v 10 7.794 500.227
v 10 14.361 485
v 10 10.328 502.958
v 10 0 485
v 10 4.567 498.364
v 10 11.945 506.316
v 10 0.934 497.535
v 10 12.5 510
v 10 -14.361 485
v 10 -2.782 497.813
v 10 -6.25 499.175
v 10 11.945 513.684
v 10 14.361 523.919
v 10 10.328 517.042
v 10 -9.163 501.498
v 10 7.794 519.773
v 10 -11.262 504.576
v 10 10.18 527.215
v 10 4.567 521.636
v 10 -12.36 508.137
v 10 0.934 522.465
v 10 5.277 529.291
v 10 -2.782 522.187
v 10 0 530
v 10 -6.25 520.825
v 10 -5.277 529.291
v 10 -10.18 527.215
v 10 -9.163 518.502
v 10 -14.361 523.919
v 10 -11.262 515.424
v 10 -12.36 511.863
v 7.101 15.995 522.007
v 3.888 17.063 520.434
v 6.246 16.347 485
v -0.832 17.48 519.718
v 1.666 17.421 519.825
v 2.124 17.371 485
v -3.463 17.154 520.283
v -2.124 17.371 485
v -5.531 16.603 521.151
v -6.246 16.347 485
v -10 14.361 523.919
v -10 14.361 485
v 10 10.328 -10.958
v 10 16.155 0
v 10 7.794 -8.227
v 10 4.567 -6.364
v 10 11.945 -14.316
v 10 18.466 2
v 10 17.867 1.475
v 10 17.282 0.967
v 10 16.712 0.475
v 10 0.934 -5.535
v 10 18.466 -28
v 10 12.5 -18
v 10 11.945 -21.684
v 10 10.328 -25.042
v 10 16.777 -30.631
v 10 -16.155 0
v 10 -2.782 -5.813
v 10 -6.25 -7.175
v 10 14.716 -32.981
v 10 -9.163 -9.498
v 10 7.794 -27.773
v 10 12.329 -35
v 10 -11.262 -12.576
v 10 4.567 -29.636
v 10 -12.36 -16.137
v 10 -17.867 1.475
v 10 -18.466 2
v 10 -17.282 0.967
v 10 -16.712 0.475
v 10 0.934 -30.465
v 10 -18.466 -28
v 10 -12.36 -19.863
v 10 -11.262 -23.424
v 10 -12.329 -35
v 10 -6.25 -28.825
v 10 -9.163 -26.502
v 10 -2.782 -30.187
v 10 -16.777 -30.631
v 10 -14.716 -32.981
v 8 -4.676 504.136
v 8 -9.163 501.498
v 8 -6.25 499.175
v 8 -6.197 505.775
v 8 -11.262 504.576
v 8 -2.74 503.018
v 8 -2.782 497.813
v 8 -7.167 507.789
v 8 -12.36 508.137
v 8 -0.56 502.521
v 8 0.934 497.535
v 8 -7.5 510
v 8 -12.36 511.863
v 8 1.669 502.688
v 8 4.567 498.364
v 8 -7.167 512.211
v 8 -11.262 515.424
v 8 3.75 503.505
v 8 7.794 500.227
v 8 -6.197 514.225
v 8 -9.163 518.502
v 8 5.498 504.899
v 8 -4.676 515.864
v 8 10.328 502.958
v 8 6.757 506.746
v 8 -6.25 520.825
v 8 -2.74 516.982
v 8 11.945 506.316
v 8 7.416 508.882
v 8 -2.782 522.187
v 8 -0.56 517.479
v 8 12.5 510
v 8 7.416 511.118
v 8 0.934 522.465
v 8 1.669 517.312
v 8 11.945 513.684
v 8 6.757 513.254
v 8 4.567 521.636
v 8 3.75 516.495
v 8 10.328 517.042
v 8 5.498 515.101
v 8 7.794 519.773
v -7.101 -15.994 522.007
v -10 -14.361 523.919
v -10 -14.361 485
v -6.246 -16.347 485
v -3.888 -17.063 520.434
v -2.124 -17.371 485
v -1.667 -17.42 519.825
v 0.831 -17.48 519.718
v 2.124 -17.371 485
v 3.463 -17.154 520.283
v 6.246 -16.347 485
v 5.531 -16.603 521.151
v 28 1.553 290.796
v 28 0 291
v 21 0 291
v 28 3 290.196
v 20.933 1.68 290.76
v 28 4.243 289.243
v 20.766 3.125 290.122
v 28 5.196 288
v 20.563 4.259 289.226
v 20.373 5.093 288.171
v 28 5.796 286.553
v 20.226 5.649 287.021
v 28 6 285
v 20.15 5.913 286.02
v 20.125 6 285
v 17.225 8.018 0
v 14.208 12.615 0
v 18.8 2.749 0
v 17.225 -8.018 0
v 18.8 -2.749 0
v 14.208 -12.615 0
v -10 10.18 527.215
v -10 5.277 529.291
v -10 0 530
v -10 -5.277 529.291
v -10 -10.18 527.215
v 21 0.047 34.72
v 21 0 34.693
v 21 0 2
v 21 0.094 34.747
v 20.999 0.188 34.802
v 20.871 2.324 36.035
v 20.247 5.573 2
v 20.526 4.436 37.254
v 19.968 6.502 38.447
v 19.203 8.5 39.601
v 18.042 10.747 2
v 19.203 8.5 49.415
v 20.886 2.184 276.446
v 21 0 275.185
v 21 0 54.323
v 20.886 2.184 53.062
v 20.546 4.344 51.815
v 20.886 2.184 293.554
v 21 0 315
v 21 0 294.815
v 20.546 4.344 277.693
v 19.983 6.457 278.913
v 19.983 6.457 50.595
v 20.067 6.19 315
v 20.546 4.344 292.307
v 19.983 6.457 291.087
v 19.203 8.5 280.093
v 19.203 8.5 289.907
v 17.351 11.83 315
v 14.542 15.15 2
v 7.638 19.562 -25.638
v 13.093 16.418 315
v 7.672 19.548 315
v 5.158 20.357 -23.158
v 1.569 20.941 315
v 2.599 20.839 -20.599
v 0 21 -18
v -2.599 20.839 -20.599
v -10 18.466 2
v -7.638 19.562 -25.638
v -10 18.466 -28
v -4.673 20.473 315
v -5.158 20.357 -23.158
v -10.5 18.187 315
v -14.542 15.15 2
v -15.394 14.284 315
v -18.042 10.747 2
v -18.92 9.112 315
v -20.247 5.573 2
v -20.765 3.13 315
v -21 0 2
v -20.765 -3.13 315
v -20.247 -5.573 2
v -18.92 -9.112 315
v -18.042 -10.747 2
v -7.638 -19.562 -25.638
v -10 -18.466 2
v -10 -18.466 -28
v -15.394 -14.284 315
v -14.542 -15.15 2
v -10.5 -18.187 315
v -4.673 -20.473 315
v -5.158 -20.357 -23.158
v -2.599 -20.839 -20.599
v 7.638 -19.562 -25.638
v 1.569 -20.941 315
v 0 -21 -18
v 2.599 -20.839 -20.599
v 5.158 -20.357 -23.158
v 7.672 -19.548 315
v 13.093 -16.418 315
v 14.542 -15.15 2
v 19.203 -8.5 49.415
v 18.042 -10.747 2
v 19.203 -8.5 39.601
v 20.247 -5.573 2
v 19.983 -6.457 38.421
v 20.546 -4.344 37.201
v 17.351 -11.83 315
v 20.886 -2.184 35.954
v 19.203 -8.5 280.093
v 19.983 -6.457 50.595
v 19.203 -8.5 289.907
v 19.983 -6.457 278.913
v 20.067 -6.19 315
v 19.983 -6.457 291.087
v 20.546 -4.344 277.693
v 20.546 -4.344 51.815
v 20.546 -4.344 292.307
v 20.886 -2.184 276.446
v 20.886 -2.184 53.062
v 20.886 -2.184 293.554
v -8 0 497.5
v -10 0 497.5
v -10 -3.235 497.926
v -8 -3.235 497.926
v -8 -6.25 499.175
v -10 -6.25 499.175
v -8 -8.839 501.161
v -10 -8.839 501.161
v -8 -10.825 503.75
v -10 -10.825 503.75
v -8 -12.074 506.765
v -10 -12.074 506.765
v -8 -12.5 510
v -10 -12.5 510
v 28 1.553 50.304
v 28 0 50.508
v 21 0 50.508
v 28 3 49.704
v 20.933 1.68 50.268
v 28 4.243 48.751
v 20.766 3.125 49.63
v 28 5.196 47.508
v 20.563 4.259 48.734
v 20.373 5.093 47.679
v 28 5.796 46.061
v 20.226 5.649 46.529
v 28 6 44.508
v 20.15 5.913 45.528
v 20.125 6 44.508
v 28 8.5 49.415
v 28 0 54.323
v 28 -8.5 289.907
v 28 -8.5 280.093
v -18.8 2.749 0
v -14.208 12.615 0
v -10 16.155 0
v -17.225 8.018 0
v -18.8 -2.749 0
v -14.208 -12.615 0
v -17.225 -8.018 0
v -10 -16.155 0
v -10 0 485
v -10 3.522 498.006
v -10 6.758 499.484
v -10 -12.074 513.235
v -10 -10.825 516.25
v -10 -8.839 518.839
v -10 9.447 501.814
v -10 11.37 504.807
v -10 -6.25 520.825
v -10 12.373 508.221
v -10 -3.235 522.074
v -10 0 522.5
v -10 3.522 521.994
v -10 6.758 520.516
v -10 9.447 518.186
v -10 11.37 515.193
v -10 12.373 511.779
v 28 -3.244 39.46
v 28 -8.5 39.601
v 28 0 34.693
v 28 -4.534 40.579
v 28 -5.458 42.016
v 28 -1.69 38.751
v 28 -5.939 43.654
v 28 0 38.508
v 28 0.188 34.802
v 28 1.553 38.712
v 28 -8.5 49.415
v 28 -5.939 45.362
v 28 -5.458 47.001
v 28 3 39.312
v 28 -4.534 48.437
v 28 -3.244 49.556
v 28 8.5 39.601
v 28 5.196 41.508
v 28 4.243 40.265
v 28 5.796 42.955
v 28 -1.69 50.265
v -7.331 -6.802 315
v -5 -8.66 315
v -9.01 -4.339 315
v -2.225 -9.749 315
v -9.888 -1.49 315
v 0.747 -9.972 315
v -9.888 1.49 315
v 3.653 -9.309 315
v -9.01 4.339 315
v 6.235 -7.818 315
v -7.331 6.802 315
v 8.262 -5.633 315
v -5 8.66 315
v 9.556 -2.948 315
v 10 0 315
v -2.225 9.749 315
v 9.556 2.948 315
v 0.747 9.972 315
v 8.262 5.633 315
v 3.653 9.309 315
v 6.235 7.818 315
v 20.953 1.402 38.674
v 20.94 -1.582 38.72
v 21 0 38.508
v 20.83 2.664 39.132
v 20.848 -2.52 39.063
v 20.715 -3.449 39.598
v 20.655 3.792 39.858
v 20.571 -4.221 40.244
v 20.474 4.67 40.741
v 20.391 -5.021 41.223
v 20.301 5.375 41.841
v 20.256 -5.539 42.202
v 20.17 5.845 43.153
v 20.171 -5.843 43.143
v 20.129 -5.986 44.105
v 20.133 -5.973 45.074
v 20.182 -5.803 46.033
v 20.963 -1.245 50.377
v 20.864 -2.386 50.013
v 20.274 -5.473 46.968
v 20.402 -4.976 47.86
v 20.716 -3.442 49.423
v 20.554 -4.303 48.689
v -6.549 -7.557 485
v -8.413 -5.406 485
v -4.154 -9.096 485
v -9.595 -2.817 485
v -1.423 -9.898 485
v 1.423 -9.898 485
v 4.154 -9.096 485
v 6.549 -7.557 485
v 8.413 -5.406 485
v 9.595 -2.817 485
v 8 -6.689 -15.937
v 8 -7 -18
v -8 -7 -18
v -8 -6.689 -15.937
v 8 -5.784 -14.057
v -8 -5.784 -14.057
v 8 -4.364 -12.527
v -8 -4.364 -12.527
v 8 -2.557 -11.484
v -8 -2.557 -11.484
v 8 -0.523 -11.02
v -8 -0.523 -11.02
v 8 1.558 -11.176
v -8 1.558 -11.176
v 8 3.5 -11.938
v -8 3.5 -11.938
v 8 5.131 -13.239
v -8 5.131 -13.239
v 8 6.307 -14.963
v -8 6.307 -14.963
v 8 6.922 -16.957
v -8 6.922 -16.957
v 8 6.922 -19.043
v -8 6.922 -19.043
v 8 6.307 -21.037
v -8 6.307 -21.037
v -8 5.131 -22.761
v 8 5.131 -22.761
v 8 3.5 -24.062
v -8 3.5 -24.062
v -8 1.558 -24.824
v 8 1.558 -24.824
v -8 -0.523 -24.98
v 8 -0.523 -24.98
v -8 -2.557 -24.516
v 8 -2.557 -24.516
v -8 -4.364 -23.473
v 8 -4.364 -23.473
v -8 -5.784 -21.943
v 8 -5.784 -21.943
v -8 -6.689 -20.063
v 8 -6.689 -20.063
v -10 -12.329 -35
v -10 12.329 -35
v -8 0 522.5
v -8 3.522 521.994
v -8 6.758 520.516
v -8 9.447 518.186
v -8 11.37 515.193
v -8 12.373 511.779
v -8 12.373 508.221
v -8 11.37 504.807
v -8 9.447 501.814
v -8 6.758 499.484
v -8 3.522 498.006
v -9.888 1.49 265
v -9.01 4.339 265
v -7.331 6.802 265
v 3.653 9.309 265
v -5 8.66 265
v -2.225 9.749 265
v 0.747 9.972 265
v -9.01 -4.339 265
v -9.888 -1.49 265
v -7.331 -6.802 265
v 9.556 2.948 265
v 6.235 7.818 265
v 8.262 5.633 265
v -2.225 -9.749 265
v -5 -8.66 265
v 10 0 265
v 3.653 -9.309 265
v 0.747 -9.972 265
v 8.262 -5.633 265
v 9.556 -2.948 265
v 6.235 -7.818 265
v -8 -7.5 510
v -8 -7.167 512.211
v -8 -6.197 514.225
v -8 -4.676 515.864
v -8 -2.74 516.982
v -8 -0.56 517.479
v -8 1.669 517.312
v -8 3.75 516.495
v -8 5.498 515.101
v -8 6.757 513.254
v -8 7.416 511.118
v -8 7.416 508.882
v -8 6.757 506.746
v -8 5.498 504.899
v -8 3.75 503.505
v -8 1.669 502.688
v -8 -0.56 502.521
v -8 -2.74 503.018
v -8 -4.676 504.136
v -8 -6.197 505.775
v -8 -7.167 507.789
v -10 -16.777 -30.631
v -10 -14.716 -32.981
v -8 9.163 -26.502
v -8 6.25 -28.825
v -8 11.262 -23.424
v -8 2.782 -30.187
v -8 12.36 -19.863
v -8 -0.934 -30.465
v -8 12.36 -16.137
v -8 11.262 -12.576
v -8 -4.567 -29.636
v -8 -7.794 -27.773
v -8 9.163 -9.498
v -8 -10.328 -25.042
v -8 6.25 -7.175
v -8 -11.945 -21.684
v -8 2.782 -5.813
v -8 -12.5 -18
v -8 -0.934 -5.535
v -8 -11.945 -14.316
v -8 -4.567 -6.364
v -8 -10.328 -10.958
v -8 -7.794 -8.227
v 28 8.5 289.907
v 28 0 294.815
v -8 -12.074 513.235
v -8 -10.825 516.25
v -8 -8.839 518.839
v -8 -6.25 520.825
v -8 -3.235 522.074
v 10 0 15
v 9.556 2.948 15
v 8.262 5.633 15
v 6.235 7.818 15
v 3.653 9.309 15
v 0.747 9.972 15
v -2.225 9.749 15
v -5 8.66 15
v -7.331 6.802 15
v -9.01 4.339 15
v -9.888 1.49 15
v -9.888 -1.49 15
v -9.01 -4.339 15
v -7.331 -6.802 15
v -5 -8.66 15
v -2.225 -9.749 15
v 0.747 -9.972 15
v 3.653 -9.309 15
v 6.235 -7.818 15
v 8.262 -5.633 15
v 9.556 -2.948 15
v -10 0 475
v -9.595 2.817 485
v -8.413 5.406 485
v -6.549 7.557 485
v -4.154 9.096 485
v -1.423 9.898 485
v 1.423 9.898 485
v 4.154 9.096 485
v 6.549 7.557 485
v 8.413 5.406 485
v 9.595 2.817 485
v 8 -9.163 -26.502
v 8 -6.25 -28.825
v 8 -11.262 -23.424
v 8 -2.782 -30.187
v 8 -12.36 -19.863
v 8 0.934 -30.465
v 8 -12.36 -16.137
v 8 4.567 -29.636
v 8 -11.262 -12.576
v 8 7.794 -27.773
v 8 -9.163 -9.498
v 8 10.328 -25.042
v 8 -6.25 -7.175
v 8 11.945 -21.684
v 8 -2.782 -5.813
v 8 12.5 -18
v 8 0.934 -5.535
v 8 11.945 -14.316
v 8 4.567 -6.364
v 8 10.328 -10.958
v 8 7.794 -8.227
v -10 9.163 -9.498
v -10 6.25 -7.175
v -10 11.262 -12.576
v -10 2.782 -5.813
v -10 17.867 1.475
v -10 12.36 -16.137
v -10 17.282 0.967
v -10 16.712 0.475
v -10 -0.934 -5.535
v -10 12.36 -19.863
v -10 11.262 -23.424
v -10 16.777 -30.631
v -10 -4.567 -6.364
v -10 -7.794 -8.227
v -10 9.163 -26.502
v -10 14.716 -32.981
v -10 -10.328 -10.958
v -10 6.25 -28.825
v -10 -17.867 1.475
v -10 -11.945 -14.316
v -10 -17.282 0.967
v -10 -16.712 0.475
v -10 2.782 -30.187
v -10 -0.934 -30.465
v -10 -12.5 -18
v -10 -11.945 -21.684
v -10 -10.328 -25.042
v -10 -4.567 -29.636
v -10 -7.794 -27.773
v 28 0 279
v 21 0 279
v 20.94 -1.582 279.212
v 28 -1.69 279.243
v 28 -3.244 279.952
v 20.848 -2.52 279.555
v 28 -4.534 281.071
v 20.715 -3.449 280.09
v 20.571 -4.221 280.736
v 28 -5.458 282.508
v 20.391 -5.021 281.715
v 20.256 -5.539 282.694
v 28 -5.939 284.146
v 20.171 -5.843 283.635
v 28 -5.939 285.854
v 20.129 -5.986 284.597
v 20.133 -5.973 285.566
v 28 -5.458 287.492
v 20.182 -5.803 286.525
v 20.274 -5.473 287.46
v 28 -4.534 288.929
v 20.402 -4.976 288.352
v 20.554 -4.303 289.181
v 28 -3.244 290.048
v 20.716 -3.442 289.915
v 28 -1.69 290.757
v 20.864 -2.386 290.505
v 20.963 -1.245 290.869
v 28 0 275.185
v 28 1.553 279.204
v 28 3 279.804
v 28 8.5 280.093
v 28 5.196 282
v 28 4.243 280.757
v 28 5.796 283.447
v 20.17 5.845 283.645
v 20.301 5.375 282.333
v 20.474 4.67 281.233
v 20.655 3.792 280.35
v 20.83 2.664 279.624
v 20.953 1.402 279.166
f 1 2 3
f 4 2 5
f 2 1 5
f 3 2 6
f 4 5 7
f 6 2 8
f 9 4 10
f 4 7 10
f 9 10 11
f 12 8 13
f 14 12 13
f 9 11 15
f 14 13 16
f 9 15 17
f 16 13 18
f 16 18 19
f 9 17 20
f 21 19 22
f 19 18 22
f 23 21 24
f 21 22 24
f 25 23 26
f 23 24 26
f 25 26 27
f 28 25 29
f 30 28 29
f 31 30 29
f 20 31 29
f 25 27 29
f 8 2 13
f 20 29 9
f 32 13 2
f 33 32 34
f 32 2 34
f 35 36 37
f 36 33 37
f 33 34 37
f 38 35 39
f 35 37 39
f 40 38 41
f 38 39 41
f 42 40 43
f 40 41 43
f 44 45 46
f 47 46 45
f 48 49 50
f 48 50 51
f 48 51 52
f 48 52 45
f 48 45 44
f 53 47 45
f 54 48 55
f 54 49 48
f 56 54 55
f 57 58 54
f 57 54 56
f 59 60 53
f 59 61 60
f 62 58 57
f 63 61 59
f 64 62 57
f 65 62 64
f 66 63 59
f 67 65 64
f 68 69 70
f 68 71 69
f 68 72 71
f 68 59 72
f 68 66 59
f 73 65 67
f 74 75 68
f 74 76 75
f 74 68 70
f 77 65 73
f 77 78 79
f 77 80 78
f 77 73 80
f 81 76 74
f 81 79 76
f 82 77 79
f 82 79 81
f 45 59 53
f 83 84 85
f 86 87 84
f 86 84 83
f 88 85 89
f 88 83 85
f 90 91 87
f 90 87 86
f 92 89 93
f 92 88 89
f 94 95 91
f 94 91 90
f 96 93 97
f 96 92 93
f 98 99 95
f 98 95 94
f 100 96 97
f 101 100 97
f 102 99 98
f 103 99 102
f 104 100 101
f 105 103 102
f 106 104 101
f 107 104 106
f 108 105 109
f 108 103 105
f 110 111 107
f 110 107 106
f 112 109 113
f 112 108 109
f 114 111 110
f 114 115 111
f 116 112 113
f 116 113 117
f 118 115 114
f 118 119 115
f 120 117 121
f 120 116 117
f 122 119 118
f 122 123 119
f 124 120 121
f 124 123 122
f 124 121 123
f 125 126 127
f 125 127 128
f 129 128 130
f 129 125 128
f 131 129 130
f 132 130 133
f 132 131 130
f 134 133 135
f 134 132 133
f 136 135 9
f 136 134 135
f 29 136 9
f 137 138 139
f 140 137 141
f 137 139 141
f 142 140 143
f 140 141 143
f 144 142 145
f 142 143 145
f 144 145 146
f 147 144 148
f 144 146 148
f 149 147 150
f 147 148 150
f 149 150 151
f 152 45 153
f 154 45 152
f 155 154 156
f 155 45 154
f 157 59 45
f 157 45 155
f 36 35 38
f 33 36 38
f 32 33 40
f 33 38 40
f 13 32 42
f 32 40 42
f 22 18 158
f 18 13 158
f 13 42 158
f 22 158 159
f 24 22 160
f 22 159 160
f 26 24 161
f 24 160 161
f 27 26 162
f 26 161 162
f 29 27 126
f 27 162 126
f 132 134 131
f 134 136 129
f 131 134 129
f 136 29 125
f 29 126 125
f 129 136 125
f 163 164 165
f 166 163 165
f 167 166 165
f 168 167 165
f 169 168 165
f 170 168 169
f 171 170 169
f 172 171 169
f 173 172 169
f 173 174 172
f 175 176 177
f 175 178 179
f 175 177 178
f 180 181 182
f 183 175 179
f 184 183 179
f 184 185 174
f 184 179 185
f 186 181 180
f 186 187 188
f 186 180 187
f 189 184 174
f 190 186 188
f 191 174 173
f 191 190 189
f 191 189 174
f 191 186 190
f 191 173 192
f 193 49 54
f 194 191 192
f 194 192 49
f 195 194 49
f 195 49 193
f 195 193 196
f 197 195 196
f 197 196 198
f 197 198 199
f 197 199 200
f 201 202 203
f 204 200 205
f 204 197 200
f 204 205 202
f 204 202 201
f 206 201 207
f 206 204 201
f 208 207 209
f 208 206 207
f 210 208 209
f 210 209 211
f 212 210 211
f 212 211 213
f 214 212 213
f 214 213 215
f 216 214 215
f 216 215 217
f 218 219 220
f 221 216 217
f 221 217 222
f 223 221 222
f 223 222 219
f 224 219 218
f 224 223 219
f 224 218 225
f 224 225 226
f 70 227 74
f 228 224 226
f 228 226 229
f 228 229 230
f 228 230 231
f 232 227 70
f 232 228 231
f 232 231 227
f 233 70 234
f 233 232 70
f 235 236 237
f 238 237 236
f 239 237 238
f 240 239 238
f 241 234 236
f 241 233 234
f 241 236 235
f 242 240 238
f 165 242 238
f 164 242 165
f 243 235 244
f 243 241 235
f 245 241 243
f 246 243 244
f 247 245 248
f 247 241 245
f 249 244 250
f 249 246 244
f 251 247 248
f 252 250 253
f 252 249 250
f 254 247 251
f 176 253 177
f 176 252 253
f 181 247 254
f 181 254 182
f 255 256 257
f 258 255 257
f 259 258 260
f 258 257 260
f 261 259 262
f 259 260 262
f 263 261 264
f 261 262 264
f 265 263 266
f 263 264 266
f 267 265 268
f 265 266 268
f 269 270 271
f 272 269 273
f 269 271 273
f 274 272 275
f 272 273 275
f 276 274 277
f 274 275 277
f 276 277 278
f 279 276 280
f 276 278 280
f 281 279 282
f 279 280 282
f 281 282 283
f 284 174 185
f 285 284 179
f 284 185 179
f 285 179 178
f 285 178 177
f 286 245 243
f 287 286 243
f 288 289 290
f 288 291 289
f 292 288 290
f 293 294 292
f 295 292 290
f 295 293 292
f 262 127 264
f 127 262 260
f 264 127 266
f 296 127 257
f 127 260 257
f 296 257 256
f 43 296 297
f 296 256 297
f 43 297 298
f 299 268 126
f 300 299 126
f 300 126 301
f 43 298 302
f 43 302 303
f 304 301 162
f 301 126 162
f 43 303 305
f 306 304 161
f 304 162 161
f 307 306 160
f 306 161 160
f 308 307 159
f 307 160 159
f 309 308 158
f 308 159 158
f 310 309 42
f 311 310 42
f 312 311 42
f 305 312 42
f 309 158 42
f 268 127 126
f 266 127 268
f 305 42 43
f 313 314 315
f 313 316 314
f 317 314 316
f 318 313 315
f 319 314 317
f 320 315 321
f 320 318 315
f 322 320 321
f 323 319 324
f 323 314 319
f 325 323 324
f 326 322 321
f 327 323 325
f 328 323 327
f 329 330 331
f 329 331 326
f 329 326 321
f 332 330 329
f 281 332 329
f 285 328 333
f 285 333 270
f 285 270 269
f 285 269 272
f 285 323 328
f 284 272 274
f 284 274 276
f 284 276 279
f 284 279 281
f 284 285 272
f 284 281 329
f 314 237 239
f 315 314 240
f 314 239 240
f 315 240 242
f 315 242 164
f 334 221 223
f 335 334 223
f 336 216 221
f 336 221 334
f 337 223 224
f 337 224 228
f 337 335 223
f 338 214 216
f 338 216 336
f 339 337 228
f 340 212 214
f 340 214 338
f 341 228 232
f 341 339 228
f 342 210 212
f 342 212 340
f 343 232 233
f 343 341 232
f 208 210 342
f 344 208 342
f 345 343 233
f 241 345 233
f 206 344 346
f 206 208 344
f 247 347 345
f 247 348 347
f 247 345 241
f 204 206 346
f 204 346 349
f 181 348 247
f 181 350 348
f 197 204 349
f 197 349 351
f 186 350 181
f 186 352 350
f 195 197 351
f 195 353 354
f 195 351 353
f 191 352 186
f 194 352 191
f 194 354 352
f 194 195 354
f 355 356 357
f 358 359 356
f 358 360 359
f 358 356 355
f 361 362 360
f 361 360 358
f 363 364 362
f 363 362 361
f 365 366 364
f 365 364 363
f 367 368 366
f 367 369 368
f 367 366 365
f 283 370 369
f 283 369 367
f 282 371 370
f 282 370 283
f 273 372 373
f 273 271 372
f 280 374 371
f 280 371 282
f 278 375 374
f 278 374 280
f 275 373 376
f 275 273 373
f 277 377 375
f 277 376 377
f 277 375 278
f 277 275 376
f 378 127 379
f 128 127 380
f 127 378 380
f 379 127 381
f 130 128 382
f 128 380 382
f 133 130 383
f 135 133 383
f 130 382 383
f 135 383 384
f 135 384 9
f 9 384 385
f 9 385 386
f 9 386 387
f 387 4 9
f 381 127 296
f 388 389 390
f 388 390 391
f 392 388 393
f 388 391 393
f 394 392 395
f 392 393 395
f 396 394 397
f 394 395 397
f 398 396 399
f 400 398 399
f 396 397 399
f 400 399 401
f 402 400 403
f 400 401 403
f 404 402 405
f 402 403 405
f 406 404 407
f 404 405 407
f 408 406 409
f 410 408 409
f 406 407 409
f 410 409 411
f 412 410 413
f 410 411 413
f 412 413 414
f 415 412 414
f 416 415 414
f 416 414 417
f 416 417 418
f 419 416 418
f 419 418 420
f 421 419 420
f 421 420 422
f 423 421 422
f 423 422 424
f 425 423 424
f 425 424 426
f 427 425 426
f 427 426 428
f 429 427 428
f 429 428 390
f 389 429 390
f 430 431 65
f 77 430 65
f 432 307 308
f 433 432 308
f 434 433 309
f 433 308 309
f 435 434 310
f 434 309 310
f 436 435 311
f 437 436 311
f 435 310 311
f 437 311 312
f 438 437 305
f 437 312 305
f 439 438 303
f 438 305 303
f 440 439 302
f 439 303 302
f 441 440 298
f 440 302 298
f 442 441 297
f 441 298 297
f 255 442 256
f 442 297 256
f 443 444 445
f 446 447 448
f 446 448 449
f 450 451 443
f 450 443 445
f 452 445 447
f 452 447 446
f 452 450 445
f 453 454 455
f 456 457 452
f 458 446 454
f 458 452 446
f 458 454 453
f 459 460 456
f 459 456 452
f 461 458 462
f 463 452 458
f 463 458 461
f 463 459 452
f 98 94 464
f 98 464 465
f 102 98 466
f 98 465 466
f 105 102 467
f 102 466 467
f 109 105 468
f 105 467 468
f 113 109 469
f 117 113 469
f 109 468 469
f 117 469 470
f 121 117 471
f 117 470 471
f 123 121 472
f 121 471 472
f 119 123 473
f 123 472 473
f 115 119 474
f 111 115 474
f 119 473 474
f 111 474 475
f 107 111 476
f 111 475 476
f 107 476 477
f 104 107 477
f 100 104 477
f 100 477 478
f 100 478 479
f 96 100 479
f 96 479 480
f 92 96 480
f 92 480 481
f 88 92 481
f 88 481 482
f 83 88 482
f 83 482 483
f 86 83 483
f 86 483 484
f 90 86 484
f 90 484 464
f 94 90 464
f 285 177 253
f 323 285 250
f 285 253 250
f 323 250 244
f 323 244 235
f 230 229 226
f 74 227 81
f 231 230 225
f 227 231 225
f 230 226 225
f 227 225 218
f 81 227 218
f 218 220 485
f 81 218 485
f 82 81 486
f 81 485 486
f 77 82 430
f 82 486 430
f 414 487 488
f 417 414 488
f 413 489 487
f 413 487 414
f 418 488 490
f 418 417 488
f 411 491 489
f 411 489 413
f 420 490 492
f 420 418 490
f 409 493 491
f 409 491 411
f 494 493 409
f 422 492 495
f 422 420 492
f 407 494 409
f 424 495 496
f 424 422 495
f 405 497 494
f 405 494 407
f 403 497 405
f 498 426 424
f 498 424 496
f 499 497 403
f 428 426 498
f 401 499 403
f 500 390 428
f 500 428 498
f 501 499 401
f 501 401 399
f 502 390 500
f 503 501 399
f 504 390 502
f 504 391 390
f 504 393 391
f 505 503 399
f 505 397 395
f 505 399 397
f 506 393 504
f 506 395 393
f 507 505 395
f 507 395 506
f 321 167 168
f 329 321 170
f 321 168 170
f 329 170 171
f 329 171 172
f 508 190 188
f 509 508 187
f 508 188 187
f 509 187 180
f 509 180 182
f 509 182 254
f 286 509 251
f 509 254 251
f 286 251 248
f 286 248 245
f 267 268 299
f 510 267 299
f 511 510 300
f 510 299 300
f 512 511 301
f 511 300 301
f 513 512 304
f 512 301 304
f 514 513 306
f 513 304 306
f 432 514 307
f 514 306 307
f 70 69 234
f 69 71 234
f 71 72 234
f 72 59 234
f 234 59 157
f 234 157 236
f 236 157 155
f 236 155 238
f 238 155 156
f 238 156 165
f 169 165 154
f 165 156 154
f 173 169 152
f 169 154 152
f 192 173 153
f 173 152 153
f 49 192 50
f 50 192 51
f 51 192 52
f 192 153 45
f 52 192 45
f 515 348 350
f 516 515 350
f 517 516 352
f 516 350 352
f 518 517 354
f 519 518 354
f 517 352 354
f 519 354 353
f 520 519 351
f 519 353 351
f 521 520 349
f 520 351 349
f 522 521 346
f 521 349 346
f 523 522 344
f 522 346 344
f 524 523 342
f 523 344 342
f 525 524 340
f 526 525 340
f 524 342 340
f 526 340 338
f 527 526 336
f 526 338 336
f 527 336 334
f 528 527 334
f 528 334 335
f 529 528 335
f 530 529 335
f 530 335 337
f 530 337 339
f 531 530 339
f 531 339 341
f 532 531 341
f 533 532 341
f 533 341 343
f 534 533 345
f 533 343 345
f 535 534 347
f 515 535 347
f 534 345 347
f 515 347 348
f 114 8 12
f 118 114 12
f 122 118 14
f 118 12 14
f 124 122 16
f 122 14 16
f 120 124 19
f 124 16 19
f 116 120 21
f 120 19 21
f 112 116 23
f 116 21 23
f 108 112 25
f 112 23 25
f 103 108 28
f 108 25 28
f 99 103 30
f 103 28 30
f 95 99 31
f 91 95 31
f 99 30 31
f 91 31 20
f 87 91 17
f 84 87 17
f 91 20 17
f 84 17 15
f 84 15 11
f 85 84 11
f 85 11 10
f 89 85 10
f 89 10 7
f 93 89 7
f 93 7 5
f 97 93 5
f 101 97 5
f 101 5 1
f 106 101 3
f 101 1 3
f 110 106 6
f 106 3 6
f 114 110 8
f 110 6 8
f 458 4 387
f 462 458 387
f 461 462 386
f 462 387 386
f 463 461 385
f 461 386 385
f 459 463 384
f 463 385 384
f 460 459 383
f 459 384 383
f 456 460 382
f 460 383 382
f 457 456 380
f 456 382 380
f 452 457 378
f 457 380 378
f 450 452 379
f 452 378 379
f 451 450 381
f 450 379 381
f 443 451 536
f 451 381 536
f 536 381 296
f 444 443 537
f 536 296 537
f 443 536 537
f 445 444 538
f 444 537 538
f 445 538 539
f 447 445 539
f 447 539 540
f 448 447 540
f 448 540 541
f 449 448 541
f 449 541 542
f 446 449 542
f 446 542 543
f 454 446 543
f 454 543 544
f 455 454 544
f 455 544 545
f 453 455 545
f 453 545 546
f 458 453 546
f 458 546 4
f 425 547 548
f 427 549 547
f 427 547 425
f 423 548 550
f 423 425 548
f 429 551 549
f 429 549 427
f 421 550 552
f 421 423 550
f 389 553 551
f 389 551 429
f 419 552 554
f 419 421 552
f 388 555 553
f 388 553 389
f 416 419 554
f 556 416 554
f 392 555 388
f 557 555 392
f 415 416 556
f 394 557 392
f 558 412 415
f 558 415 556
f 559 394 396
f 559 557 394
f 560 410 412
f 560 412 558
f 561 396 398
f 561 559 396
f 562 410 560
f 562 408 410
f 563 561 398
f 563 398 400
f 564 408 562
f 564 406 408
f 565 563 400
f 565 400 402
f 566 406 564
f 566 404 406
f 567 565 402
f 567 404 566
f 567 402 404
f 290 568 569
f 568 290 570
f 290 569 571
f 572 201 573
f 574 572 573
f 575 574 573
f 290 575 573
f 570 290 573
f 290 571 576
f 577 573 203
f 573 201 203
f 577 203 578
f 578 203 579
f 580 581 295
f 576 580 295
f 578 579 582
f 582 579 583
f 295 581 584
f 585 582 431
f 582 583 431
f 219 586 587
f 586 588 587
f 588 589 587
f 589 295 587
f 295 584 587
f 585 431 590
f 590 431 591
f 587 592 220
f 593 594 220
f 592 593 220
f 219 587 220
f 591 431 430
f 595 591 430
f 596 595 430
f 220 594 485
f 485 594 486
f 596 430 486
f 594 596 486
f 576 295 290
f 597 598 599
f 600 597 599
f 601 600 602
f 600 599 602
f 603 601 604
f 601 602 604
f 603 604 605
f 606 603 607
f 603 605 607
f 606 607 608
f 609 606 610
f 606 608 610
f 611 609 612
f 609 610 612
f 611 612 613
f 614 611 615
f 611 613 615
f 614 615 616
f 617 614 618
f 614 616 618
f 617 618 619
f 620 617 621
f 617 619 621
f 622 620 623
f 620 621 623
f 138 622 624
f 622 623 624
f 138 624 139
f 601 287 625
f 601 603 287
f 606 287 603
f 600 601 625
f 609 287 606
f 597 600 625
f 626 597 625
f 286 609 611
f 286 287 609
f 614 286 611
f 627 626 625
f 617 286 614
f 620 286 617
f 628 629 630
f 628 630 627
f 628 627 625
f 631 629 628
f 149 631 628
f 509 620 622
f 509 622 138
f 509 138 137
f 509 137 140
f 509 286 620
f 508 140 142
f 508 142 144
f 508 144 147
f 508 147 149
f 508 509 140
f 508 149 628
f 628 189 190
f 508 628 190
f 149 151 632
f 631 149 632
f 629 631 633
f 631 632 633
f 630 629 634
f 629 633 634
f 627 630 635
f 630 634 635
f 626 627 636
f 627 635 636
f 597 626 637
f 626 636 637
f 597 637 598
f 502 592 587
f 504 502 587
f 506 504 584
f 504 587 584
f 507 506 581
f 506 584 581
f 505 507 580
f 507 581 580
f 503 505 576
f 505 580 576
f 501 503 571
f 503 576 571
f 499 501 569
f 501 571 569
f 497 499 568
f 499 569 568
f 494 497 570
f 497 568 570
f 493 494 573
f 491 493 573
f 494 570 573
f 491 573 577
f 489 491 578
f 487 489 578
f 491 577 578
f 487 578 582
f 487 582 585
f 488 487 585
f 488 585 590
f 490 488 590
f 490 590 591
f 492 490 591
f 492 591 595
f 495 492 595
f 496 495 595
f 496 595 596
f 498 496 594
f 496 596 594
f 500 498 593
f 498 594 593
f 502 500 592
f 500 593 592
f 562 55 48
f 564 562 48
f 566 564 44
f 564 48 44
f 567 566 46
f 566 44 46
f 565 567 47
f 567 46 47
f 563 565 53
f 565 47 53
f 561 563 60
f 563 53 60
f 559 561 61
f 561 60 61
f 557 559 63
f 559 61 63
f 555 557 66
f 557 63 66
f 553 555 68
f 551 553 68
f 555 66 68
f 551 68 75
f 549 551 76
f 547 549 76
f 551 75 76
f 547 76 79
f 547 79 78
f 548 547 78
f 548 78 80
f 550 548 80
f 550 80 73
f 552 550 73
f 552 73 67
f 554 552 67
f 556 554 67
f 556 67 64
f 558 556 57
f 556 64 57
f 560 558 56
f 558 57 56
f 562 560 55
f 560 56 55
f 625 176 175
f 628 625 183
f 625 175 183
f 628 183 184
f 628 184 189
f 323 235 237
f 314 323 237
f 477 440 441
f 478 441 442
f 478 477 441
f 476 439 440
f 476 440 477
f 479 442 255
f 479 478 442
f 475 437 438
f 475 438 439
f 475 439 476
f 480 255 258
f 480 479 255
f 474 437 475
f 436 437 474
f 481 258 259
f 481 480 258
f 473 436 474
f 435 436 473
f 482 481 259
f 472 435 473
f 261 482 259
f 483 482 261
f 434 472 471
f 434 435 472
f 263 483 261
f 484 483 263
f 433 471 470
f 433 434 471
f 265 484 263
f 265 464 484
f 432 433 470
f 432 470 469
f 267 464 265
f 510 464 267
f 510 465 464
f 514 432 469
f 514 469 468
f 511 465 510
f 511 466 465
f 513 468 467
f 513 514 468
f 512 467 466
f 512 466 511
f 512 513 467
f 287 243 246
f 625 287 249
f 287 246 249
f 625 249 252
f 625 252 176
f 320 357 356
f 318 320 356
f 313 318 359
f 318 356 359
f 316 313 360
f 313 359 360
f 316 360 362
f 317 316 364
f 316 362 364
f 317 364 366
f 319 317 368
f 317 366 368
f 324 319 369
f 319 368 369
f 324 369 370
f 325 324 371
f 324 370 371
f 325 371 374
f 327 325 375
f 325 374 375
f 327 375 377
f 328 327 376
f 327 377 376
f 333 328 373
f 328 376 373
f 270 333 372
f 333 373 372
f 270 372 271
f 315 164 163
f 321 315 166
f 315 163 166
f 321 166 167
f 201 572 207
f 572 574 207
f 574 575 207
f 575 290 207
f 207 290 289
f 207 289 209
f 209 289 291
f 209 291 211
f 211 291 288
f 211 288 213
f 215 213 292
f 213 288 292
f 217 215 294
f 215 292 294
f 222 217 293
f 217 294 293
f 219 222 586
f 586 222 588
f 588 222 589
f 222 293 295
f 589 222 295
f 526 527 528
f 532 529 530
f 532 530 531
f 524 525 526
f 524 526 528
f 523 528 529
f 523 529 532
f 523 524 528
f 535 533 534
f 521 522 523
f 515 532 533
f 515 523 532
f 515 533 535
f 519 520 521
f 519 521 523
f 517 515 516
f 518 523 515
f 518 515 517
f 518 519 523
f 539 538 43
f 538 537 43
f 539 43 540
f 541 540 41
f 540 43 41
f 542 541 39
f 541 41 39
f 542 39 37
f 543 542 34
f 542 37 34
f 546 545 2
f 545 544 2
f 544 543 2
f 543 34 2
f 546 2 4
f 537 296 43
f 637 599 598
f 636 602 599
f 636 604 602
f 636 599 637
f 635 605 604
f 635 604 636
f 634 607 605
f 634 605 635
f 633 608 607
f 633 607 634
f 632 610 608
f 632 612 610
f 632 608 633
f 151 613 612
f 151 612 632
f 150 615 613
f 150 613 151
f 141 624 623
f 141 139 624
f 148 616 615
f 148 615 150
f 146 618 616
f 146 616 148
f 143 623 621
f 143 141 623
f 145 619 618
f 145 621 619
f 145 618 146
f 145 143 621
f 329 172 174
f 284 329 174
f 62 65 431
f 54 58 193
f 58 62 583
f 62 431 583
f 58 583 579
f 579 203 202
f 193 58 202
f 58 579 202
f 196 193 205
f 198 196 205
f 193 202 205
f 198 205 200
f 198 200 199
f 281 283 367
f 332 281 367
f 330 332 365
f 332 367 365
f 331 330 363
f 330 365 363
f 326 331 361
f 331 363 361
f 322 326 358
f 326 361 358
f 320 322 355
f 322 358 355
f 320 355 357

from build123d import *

# Parameters (mm, degrees)
F0_R      = 21
F1_DEPTH  = 315
F2_R      = 10
F3_DEPTH  = 300
F4_R      = 21
F5_DEPTH  = 35
F6_W      = 15.6832183711
F6_H      = 49.8256795108
F6_W_2    = 16.2493828684
F6_H_2    = 44.8511093855
F7_DEPTH  = 35
F8_R      = 12.5
F9_DEPTH  = 2
F10_R     = 7
F11_DEPTH = 25
F12_R     = 12.5
F13_DEPTH = 2
F15_DEPTH = 25
F16_SIZE  = 2
F17_R     = 10
F18_DEPTH = 200
F19_R     = 10
F20_DEPTH = 50
F21_R     = 17.5
F21_R_2   = 10
F22_DEPTH = 30
F23_R     = 17.5
F24_DEPTH = 20
F26_DEPTH = 60
F28_DEPTH = 2
F29_R     = 7.5
F30_DEPTH = 25
F31_R     = 12.5
F31_R_2   = 7.5
F32_DEPTH = 2
F34_DEPTH = 25
F36_DEPTH = 18


with BuildPart() as f1:
    # F0 (on Top) → F1 (new body)
    with BuildSketch(Plane.XY):
        Circle(F0_R)
    extrude(amount=F1_DEPTH)

    # F2 (on face) → F3 (cut)
    with BuildSketch(Plane.XY.offset(315)):
        Circle(F2_R)
    extrude(amount=-F3_DEPTH, mode=Mode.SUBTRACT)

    # F4 (on face) → F5 (join)
    with BuildSketch(Plane.XY):
        Circle(F4_R)
    extrude(amount=-F5_DEPTH)

    # F6 (on face) → F7 (cut)
    with BuildSketch(Plane(origin=(0, 0, -35), x_dir=(1, 0, 0), z_dir=(0, 0, -1))):
        with Locations((17.8416091856, -0.4472155124)):
            Rectangle(F6_W, F6_H)
        with Locations((-18.1246914342, 1.4644041657)):
            Rectangle(F6_W_2, F6_H_2)
    extrude(amount=-F7_DEPTH, mode=Mode.SUBTRACT)

    # F8 (on face) → F9 (cut)
    with BuildSketch(Plane(origin=(-10, 0, 0), x_dir=(0, -1, 0), z_dir=(-1, 0, 0))):
        with Locations((0, -18)):
            Circle(F8_R)
    extrude(amount=-F9_DEPTH, mode=Mode.SUBTRACT)

    # F10 (on face) → F11 (cut)
    with BuildSketch(Plane(origin=(-8, 0, 0), x_dir=(0, -1, 0), z_dir=(-1, 0, 0))):
        with Locations((0, -18)):
            Circle(F10_R)
    extrude(amount=-F11_DEPTH, mode=Mode.SUBTRACT)

    # F12 (on face) → F13 (cut)
    with BuildSketch(Plane.YZ.offset(10)):
        with Locations((0, -18)):
            Circle(F12_R)
    extrude(amount=-F13_DEPTH, mode=Mode.SUBTRACT)

    # F14 (on face) → F15 (cut)
    with BuildSketch(Plane(origin=(-10, 0, 0), x_dir=(0, -1, 0), z_dir=(-1, 0, 0))):
        with BuildLine():
            ThreePointArc((21, -18), (0, -39), (-21, -18))
            Line((-21, -18), (-30, -18))
            ThreePointArc((-30, -18), (0, -48), (30, -18))
            Line((30, -18), (21, -18))
        make_face()
    extrude(amount=-F15_DEPTH, mode=Mode.SUBTRACT)

    # F16
    f16_edges = [f1.edges().sort_by_distance(p)[0] for p in [
        (18.041619, 10.747093, 0),
        (18.041619, -10.747093, 0),
        (-21, 0, 0),
    ]]
    chamfer(f16_edges, length=F16_SIZE)

    # F35 (on face) → F36 (join)
    with BuildSketch(Plane.YZ.offset(10)):
        with BuildLine():
            Line((0, 50.508012673), (0, 54.3229672492))
            Line((0, 54.3229672492), (-8.5, 49.4154899611))
            Line((-8.5, 49.4154899611), (-8.5, 39.6005353849))
            Line((-8.5, 39.6005353849), (0, 34.6930580967))
            Line((0, 34.6930580967), (0, 38.508012673))
            ThreePointArc((0, 38.508012673), (-6, 44.508012673), (0, 50.508012673))
        make_face()
        with BuildLine():
            Line((-8.5, 280.0925227119), (0, 275.1850454238))
            Line((0, 275.1850454238), (0, 279))
            ThreePointArc((0, 279), (-6, 285), (0, 291))
            Line((0, 291), (0, 294.8149545762))
            Line((0, 294.8149545762), (-8.5, 289.9074772881))
            Line((-8.5, 289.9074772881), (-8.5, 280.0925227119))
        make_face()
        with BuildLine():
            Line((0, 279), (0, 275.1850454238))
            Line((0, 275.1850454238), (8.5, 280.0925227119))
            Line((8.5, 280.0925227119), (8.5, 289.9074772881))
            Line((8.5, 289.9074772881), (0, 294.8149545762))
            Line((0, 294.8149545762), (0, 291))
            ThreePointArc((0, 291), (4.2426406871, 289.2426406871), (6, 285))
            ThreePointArc((6, 285), (4.2426406871, 280.7573593129), (0, 279))
        make_face()
        with BuildLine():
            Line((8.5, 49.4154899611), (0, 54.3229672492))
            Line((0, 54.3229672492), (0, 50.508012673))
            ThreePointArc((0, 50.508012673), (4.2426406871, 48.7506533601), (6, 44.508012673))
            ThreePointArc((6, 44.508012673), (4.2426406871, 40.2653719858), (0, 38.508012673))
            Line((0, 38.508012673), (0, 34.6930580967))
            Line((0, 34.6930580967), (0.1884949477, 34.8018857055))
            Line((0.1884949477, 34.8018857055), (8.5, 39.6005353849))
            Line((8.5, 39.6005353849), (8.5, 49.4154899611))
        make_face()
    extrude(amount=F36_DEPTH)


with BuildPart() as f18:
    # F17 (on face) → F18 (new body)
    with BuildSketch(Plane.XY.offset(315)):
        Circle(F17_R)
    extrude(amount=F18_DEPTH)

    # F19 (on face) → F20 (join)
    with BuildSketch(Plane(origin=(0, 0, 315), x_dir=(1, 0, 0), z_dir=(0, 0, -1))):
        Circle(F19_R)
    extrude(amount=F20_DEPTH)

    # F21 (on face) → F22 (join)
    with BuildSketch(Plane.XY.offset(515)):
        Circle(F21_R)
        Circle(F21_R_2, mode=Mode.SUBTRACT)
        Circle(F21_R_2)
    extrude(amount=-F22_DEPTH)

    # F23 (on face) → F24 (join)
    with BuildSketch(Plane.XY.offset(515)):
        Circle(F23_R)
    extrude(amount=F24_DEPTH)

    # F25 (on face) → F26 (cut)
    with BuildSketch(Plane.XY.offset(535)):
        with BuildLine():
            ThreePointArc((-10, 14.3614066163), (-17.5, 0), (-10, -14.3614066163))
            Line((-10, -14.3614066163), (-10, 14.3614066163))
        make_face()
        with BuildLine():
            ThreePointArc((17.5, 0), (15.5120920575, 8.100925873), (10, 14.3614066163))
            Line((10, 14.3614066163), (10, -14.3614066163))
            ThreePointArc((10, -14.3614066163), (15.5120920575, -8.100925873), (17.5, 0))
        make_face()
    extrude(amount=-F26_DEPTH, mode=Mode.SUBTRACT)

    # F27 (on face) → F28 (cut)
    with BuildSketch(Plane(origin=(-10, 0, 0), x_dir=(0, -1, 0), z_dir=(-1, 0, 0))):
        with BuildLine():
            ThreePointArc((12.5, 510), (8.8388347648, 518.8388347648), (0, 522.5))
            Line((0, 522.5), (0, 497.5))
            ThreePointArc((0, 497.5), (8.8388347648, 501.1611652352), (12.5, 510))
        make_face()
        with BuildLine():
            Line((0, 497.5), (0, 522.5))
            ThreePointArc((0, 522.5), (-12.5, 510), (0, 497.5))
        make_face()
    extrude(amount=-F28_DEPTH, mode=Mode.SUBTRACT)

    # F29 (on face) → F30 (cut)
    with BuildSketch(Plane(origin=(-8, 0, 0), x_dir=(0, -1, 0), z_dir=(-1, 0, 0))):
        with Locations((0, 510)):
            Circle(F29_R)
    extrude(amount=-F30_DEPTH, mode=Mode.SUBTRACT)

    # F31 (on face) → F32 (cut)
    with BuildSketch(Plane.YZ.offset(10)):
        with Locations((0, 510)):
            Circle(F31_R)
        with Locations((0, 510)):
            Circle(F31_R_2, mode=Mode.SUBTRACT)
        with Locations((0, 510)):
            Circle(F31_R)
    extrude(amount=-F32_DEPTH, mode=Mode.SUBTRACT)

    # F33 (on face) → F34 (cut)
    with BuildSketch(Plane(origin=(-10, 0, 0), x_dir=(0, -1, 0), z_dir=(-1, 0, 0))):
        with BuildLine():
            ThreePointArc((-20, 510), (0, 530), (20, 510))
            Line((20, 510), (33.9818404813, 510))
            ThreePointArc((33.9818404813, 510), (0, 543.9818404813), (-33.9818404813, 510))
            Line((-33.9818404813, 510), (-20, 510))
        make_face()
    extrude(amount=-F34_DEPTH, mode=Mode.SUBTRACT)


solid = Compound([f1.part, f18.part])
